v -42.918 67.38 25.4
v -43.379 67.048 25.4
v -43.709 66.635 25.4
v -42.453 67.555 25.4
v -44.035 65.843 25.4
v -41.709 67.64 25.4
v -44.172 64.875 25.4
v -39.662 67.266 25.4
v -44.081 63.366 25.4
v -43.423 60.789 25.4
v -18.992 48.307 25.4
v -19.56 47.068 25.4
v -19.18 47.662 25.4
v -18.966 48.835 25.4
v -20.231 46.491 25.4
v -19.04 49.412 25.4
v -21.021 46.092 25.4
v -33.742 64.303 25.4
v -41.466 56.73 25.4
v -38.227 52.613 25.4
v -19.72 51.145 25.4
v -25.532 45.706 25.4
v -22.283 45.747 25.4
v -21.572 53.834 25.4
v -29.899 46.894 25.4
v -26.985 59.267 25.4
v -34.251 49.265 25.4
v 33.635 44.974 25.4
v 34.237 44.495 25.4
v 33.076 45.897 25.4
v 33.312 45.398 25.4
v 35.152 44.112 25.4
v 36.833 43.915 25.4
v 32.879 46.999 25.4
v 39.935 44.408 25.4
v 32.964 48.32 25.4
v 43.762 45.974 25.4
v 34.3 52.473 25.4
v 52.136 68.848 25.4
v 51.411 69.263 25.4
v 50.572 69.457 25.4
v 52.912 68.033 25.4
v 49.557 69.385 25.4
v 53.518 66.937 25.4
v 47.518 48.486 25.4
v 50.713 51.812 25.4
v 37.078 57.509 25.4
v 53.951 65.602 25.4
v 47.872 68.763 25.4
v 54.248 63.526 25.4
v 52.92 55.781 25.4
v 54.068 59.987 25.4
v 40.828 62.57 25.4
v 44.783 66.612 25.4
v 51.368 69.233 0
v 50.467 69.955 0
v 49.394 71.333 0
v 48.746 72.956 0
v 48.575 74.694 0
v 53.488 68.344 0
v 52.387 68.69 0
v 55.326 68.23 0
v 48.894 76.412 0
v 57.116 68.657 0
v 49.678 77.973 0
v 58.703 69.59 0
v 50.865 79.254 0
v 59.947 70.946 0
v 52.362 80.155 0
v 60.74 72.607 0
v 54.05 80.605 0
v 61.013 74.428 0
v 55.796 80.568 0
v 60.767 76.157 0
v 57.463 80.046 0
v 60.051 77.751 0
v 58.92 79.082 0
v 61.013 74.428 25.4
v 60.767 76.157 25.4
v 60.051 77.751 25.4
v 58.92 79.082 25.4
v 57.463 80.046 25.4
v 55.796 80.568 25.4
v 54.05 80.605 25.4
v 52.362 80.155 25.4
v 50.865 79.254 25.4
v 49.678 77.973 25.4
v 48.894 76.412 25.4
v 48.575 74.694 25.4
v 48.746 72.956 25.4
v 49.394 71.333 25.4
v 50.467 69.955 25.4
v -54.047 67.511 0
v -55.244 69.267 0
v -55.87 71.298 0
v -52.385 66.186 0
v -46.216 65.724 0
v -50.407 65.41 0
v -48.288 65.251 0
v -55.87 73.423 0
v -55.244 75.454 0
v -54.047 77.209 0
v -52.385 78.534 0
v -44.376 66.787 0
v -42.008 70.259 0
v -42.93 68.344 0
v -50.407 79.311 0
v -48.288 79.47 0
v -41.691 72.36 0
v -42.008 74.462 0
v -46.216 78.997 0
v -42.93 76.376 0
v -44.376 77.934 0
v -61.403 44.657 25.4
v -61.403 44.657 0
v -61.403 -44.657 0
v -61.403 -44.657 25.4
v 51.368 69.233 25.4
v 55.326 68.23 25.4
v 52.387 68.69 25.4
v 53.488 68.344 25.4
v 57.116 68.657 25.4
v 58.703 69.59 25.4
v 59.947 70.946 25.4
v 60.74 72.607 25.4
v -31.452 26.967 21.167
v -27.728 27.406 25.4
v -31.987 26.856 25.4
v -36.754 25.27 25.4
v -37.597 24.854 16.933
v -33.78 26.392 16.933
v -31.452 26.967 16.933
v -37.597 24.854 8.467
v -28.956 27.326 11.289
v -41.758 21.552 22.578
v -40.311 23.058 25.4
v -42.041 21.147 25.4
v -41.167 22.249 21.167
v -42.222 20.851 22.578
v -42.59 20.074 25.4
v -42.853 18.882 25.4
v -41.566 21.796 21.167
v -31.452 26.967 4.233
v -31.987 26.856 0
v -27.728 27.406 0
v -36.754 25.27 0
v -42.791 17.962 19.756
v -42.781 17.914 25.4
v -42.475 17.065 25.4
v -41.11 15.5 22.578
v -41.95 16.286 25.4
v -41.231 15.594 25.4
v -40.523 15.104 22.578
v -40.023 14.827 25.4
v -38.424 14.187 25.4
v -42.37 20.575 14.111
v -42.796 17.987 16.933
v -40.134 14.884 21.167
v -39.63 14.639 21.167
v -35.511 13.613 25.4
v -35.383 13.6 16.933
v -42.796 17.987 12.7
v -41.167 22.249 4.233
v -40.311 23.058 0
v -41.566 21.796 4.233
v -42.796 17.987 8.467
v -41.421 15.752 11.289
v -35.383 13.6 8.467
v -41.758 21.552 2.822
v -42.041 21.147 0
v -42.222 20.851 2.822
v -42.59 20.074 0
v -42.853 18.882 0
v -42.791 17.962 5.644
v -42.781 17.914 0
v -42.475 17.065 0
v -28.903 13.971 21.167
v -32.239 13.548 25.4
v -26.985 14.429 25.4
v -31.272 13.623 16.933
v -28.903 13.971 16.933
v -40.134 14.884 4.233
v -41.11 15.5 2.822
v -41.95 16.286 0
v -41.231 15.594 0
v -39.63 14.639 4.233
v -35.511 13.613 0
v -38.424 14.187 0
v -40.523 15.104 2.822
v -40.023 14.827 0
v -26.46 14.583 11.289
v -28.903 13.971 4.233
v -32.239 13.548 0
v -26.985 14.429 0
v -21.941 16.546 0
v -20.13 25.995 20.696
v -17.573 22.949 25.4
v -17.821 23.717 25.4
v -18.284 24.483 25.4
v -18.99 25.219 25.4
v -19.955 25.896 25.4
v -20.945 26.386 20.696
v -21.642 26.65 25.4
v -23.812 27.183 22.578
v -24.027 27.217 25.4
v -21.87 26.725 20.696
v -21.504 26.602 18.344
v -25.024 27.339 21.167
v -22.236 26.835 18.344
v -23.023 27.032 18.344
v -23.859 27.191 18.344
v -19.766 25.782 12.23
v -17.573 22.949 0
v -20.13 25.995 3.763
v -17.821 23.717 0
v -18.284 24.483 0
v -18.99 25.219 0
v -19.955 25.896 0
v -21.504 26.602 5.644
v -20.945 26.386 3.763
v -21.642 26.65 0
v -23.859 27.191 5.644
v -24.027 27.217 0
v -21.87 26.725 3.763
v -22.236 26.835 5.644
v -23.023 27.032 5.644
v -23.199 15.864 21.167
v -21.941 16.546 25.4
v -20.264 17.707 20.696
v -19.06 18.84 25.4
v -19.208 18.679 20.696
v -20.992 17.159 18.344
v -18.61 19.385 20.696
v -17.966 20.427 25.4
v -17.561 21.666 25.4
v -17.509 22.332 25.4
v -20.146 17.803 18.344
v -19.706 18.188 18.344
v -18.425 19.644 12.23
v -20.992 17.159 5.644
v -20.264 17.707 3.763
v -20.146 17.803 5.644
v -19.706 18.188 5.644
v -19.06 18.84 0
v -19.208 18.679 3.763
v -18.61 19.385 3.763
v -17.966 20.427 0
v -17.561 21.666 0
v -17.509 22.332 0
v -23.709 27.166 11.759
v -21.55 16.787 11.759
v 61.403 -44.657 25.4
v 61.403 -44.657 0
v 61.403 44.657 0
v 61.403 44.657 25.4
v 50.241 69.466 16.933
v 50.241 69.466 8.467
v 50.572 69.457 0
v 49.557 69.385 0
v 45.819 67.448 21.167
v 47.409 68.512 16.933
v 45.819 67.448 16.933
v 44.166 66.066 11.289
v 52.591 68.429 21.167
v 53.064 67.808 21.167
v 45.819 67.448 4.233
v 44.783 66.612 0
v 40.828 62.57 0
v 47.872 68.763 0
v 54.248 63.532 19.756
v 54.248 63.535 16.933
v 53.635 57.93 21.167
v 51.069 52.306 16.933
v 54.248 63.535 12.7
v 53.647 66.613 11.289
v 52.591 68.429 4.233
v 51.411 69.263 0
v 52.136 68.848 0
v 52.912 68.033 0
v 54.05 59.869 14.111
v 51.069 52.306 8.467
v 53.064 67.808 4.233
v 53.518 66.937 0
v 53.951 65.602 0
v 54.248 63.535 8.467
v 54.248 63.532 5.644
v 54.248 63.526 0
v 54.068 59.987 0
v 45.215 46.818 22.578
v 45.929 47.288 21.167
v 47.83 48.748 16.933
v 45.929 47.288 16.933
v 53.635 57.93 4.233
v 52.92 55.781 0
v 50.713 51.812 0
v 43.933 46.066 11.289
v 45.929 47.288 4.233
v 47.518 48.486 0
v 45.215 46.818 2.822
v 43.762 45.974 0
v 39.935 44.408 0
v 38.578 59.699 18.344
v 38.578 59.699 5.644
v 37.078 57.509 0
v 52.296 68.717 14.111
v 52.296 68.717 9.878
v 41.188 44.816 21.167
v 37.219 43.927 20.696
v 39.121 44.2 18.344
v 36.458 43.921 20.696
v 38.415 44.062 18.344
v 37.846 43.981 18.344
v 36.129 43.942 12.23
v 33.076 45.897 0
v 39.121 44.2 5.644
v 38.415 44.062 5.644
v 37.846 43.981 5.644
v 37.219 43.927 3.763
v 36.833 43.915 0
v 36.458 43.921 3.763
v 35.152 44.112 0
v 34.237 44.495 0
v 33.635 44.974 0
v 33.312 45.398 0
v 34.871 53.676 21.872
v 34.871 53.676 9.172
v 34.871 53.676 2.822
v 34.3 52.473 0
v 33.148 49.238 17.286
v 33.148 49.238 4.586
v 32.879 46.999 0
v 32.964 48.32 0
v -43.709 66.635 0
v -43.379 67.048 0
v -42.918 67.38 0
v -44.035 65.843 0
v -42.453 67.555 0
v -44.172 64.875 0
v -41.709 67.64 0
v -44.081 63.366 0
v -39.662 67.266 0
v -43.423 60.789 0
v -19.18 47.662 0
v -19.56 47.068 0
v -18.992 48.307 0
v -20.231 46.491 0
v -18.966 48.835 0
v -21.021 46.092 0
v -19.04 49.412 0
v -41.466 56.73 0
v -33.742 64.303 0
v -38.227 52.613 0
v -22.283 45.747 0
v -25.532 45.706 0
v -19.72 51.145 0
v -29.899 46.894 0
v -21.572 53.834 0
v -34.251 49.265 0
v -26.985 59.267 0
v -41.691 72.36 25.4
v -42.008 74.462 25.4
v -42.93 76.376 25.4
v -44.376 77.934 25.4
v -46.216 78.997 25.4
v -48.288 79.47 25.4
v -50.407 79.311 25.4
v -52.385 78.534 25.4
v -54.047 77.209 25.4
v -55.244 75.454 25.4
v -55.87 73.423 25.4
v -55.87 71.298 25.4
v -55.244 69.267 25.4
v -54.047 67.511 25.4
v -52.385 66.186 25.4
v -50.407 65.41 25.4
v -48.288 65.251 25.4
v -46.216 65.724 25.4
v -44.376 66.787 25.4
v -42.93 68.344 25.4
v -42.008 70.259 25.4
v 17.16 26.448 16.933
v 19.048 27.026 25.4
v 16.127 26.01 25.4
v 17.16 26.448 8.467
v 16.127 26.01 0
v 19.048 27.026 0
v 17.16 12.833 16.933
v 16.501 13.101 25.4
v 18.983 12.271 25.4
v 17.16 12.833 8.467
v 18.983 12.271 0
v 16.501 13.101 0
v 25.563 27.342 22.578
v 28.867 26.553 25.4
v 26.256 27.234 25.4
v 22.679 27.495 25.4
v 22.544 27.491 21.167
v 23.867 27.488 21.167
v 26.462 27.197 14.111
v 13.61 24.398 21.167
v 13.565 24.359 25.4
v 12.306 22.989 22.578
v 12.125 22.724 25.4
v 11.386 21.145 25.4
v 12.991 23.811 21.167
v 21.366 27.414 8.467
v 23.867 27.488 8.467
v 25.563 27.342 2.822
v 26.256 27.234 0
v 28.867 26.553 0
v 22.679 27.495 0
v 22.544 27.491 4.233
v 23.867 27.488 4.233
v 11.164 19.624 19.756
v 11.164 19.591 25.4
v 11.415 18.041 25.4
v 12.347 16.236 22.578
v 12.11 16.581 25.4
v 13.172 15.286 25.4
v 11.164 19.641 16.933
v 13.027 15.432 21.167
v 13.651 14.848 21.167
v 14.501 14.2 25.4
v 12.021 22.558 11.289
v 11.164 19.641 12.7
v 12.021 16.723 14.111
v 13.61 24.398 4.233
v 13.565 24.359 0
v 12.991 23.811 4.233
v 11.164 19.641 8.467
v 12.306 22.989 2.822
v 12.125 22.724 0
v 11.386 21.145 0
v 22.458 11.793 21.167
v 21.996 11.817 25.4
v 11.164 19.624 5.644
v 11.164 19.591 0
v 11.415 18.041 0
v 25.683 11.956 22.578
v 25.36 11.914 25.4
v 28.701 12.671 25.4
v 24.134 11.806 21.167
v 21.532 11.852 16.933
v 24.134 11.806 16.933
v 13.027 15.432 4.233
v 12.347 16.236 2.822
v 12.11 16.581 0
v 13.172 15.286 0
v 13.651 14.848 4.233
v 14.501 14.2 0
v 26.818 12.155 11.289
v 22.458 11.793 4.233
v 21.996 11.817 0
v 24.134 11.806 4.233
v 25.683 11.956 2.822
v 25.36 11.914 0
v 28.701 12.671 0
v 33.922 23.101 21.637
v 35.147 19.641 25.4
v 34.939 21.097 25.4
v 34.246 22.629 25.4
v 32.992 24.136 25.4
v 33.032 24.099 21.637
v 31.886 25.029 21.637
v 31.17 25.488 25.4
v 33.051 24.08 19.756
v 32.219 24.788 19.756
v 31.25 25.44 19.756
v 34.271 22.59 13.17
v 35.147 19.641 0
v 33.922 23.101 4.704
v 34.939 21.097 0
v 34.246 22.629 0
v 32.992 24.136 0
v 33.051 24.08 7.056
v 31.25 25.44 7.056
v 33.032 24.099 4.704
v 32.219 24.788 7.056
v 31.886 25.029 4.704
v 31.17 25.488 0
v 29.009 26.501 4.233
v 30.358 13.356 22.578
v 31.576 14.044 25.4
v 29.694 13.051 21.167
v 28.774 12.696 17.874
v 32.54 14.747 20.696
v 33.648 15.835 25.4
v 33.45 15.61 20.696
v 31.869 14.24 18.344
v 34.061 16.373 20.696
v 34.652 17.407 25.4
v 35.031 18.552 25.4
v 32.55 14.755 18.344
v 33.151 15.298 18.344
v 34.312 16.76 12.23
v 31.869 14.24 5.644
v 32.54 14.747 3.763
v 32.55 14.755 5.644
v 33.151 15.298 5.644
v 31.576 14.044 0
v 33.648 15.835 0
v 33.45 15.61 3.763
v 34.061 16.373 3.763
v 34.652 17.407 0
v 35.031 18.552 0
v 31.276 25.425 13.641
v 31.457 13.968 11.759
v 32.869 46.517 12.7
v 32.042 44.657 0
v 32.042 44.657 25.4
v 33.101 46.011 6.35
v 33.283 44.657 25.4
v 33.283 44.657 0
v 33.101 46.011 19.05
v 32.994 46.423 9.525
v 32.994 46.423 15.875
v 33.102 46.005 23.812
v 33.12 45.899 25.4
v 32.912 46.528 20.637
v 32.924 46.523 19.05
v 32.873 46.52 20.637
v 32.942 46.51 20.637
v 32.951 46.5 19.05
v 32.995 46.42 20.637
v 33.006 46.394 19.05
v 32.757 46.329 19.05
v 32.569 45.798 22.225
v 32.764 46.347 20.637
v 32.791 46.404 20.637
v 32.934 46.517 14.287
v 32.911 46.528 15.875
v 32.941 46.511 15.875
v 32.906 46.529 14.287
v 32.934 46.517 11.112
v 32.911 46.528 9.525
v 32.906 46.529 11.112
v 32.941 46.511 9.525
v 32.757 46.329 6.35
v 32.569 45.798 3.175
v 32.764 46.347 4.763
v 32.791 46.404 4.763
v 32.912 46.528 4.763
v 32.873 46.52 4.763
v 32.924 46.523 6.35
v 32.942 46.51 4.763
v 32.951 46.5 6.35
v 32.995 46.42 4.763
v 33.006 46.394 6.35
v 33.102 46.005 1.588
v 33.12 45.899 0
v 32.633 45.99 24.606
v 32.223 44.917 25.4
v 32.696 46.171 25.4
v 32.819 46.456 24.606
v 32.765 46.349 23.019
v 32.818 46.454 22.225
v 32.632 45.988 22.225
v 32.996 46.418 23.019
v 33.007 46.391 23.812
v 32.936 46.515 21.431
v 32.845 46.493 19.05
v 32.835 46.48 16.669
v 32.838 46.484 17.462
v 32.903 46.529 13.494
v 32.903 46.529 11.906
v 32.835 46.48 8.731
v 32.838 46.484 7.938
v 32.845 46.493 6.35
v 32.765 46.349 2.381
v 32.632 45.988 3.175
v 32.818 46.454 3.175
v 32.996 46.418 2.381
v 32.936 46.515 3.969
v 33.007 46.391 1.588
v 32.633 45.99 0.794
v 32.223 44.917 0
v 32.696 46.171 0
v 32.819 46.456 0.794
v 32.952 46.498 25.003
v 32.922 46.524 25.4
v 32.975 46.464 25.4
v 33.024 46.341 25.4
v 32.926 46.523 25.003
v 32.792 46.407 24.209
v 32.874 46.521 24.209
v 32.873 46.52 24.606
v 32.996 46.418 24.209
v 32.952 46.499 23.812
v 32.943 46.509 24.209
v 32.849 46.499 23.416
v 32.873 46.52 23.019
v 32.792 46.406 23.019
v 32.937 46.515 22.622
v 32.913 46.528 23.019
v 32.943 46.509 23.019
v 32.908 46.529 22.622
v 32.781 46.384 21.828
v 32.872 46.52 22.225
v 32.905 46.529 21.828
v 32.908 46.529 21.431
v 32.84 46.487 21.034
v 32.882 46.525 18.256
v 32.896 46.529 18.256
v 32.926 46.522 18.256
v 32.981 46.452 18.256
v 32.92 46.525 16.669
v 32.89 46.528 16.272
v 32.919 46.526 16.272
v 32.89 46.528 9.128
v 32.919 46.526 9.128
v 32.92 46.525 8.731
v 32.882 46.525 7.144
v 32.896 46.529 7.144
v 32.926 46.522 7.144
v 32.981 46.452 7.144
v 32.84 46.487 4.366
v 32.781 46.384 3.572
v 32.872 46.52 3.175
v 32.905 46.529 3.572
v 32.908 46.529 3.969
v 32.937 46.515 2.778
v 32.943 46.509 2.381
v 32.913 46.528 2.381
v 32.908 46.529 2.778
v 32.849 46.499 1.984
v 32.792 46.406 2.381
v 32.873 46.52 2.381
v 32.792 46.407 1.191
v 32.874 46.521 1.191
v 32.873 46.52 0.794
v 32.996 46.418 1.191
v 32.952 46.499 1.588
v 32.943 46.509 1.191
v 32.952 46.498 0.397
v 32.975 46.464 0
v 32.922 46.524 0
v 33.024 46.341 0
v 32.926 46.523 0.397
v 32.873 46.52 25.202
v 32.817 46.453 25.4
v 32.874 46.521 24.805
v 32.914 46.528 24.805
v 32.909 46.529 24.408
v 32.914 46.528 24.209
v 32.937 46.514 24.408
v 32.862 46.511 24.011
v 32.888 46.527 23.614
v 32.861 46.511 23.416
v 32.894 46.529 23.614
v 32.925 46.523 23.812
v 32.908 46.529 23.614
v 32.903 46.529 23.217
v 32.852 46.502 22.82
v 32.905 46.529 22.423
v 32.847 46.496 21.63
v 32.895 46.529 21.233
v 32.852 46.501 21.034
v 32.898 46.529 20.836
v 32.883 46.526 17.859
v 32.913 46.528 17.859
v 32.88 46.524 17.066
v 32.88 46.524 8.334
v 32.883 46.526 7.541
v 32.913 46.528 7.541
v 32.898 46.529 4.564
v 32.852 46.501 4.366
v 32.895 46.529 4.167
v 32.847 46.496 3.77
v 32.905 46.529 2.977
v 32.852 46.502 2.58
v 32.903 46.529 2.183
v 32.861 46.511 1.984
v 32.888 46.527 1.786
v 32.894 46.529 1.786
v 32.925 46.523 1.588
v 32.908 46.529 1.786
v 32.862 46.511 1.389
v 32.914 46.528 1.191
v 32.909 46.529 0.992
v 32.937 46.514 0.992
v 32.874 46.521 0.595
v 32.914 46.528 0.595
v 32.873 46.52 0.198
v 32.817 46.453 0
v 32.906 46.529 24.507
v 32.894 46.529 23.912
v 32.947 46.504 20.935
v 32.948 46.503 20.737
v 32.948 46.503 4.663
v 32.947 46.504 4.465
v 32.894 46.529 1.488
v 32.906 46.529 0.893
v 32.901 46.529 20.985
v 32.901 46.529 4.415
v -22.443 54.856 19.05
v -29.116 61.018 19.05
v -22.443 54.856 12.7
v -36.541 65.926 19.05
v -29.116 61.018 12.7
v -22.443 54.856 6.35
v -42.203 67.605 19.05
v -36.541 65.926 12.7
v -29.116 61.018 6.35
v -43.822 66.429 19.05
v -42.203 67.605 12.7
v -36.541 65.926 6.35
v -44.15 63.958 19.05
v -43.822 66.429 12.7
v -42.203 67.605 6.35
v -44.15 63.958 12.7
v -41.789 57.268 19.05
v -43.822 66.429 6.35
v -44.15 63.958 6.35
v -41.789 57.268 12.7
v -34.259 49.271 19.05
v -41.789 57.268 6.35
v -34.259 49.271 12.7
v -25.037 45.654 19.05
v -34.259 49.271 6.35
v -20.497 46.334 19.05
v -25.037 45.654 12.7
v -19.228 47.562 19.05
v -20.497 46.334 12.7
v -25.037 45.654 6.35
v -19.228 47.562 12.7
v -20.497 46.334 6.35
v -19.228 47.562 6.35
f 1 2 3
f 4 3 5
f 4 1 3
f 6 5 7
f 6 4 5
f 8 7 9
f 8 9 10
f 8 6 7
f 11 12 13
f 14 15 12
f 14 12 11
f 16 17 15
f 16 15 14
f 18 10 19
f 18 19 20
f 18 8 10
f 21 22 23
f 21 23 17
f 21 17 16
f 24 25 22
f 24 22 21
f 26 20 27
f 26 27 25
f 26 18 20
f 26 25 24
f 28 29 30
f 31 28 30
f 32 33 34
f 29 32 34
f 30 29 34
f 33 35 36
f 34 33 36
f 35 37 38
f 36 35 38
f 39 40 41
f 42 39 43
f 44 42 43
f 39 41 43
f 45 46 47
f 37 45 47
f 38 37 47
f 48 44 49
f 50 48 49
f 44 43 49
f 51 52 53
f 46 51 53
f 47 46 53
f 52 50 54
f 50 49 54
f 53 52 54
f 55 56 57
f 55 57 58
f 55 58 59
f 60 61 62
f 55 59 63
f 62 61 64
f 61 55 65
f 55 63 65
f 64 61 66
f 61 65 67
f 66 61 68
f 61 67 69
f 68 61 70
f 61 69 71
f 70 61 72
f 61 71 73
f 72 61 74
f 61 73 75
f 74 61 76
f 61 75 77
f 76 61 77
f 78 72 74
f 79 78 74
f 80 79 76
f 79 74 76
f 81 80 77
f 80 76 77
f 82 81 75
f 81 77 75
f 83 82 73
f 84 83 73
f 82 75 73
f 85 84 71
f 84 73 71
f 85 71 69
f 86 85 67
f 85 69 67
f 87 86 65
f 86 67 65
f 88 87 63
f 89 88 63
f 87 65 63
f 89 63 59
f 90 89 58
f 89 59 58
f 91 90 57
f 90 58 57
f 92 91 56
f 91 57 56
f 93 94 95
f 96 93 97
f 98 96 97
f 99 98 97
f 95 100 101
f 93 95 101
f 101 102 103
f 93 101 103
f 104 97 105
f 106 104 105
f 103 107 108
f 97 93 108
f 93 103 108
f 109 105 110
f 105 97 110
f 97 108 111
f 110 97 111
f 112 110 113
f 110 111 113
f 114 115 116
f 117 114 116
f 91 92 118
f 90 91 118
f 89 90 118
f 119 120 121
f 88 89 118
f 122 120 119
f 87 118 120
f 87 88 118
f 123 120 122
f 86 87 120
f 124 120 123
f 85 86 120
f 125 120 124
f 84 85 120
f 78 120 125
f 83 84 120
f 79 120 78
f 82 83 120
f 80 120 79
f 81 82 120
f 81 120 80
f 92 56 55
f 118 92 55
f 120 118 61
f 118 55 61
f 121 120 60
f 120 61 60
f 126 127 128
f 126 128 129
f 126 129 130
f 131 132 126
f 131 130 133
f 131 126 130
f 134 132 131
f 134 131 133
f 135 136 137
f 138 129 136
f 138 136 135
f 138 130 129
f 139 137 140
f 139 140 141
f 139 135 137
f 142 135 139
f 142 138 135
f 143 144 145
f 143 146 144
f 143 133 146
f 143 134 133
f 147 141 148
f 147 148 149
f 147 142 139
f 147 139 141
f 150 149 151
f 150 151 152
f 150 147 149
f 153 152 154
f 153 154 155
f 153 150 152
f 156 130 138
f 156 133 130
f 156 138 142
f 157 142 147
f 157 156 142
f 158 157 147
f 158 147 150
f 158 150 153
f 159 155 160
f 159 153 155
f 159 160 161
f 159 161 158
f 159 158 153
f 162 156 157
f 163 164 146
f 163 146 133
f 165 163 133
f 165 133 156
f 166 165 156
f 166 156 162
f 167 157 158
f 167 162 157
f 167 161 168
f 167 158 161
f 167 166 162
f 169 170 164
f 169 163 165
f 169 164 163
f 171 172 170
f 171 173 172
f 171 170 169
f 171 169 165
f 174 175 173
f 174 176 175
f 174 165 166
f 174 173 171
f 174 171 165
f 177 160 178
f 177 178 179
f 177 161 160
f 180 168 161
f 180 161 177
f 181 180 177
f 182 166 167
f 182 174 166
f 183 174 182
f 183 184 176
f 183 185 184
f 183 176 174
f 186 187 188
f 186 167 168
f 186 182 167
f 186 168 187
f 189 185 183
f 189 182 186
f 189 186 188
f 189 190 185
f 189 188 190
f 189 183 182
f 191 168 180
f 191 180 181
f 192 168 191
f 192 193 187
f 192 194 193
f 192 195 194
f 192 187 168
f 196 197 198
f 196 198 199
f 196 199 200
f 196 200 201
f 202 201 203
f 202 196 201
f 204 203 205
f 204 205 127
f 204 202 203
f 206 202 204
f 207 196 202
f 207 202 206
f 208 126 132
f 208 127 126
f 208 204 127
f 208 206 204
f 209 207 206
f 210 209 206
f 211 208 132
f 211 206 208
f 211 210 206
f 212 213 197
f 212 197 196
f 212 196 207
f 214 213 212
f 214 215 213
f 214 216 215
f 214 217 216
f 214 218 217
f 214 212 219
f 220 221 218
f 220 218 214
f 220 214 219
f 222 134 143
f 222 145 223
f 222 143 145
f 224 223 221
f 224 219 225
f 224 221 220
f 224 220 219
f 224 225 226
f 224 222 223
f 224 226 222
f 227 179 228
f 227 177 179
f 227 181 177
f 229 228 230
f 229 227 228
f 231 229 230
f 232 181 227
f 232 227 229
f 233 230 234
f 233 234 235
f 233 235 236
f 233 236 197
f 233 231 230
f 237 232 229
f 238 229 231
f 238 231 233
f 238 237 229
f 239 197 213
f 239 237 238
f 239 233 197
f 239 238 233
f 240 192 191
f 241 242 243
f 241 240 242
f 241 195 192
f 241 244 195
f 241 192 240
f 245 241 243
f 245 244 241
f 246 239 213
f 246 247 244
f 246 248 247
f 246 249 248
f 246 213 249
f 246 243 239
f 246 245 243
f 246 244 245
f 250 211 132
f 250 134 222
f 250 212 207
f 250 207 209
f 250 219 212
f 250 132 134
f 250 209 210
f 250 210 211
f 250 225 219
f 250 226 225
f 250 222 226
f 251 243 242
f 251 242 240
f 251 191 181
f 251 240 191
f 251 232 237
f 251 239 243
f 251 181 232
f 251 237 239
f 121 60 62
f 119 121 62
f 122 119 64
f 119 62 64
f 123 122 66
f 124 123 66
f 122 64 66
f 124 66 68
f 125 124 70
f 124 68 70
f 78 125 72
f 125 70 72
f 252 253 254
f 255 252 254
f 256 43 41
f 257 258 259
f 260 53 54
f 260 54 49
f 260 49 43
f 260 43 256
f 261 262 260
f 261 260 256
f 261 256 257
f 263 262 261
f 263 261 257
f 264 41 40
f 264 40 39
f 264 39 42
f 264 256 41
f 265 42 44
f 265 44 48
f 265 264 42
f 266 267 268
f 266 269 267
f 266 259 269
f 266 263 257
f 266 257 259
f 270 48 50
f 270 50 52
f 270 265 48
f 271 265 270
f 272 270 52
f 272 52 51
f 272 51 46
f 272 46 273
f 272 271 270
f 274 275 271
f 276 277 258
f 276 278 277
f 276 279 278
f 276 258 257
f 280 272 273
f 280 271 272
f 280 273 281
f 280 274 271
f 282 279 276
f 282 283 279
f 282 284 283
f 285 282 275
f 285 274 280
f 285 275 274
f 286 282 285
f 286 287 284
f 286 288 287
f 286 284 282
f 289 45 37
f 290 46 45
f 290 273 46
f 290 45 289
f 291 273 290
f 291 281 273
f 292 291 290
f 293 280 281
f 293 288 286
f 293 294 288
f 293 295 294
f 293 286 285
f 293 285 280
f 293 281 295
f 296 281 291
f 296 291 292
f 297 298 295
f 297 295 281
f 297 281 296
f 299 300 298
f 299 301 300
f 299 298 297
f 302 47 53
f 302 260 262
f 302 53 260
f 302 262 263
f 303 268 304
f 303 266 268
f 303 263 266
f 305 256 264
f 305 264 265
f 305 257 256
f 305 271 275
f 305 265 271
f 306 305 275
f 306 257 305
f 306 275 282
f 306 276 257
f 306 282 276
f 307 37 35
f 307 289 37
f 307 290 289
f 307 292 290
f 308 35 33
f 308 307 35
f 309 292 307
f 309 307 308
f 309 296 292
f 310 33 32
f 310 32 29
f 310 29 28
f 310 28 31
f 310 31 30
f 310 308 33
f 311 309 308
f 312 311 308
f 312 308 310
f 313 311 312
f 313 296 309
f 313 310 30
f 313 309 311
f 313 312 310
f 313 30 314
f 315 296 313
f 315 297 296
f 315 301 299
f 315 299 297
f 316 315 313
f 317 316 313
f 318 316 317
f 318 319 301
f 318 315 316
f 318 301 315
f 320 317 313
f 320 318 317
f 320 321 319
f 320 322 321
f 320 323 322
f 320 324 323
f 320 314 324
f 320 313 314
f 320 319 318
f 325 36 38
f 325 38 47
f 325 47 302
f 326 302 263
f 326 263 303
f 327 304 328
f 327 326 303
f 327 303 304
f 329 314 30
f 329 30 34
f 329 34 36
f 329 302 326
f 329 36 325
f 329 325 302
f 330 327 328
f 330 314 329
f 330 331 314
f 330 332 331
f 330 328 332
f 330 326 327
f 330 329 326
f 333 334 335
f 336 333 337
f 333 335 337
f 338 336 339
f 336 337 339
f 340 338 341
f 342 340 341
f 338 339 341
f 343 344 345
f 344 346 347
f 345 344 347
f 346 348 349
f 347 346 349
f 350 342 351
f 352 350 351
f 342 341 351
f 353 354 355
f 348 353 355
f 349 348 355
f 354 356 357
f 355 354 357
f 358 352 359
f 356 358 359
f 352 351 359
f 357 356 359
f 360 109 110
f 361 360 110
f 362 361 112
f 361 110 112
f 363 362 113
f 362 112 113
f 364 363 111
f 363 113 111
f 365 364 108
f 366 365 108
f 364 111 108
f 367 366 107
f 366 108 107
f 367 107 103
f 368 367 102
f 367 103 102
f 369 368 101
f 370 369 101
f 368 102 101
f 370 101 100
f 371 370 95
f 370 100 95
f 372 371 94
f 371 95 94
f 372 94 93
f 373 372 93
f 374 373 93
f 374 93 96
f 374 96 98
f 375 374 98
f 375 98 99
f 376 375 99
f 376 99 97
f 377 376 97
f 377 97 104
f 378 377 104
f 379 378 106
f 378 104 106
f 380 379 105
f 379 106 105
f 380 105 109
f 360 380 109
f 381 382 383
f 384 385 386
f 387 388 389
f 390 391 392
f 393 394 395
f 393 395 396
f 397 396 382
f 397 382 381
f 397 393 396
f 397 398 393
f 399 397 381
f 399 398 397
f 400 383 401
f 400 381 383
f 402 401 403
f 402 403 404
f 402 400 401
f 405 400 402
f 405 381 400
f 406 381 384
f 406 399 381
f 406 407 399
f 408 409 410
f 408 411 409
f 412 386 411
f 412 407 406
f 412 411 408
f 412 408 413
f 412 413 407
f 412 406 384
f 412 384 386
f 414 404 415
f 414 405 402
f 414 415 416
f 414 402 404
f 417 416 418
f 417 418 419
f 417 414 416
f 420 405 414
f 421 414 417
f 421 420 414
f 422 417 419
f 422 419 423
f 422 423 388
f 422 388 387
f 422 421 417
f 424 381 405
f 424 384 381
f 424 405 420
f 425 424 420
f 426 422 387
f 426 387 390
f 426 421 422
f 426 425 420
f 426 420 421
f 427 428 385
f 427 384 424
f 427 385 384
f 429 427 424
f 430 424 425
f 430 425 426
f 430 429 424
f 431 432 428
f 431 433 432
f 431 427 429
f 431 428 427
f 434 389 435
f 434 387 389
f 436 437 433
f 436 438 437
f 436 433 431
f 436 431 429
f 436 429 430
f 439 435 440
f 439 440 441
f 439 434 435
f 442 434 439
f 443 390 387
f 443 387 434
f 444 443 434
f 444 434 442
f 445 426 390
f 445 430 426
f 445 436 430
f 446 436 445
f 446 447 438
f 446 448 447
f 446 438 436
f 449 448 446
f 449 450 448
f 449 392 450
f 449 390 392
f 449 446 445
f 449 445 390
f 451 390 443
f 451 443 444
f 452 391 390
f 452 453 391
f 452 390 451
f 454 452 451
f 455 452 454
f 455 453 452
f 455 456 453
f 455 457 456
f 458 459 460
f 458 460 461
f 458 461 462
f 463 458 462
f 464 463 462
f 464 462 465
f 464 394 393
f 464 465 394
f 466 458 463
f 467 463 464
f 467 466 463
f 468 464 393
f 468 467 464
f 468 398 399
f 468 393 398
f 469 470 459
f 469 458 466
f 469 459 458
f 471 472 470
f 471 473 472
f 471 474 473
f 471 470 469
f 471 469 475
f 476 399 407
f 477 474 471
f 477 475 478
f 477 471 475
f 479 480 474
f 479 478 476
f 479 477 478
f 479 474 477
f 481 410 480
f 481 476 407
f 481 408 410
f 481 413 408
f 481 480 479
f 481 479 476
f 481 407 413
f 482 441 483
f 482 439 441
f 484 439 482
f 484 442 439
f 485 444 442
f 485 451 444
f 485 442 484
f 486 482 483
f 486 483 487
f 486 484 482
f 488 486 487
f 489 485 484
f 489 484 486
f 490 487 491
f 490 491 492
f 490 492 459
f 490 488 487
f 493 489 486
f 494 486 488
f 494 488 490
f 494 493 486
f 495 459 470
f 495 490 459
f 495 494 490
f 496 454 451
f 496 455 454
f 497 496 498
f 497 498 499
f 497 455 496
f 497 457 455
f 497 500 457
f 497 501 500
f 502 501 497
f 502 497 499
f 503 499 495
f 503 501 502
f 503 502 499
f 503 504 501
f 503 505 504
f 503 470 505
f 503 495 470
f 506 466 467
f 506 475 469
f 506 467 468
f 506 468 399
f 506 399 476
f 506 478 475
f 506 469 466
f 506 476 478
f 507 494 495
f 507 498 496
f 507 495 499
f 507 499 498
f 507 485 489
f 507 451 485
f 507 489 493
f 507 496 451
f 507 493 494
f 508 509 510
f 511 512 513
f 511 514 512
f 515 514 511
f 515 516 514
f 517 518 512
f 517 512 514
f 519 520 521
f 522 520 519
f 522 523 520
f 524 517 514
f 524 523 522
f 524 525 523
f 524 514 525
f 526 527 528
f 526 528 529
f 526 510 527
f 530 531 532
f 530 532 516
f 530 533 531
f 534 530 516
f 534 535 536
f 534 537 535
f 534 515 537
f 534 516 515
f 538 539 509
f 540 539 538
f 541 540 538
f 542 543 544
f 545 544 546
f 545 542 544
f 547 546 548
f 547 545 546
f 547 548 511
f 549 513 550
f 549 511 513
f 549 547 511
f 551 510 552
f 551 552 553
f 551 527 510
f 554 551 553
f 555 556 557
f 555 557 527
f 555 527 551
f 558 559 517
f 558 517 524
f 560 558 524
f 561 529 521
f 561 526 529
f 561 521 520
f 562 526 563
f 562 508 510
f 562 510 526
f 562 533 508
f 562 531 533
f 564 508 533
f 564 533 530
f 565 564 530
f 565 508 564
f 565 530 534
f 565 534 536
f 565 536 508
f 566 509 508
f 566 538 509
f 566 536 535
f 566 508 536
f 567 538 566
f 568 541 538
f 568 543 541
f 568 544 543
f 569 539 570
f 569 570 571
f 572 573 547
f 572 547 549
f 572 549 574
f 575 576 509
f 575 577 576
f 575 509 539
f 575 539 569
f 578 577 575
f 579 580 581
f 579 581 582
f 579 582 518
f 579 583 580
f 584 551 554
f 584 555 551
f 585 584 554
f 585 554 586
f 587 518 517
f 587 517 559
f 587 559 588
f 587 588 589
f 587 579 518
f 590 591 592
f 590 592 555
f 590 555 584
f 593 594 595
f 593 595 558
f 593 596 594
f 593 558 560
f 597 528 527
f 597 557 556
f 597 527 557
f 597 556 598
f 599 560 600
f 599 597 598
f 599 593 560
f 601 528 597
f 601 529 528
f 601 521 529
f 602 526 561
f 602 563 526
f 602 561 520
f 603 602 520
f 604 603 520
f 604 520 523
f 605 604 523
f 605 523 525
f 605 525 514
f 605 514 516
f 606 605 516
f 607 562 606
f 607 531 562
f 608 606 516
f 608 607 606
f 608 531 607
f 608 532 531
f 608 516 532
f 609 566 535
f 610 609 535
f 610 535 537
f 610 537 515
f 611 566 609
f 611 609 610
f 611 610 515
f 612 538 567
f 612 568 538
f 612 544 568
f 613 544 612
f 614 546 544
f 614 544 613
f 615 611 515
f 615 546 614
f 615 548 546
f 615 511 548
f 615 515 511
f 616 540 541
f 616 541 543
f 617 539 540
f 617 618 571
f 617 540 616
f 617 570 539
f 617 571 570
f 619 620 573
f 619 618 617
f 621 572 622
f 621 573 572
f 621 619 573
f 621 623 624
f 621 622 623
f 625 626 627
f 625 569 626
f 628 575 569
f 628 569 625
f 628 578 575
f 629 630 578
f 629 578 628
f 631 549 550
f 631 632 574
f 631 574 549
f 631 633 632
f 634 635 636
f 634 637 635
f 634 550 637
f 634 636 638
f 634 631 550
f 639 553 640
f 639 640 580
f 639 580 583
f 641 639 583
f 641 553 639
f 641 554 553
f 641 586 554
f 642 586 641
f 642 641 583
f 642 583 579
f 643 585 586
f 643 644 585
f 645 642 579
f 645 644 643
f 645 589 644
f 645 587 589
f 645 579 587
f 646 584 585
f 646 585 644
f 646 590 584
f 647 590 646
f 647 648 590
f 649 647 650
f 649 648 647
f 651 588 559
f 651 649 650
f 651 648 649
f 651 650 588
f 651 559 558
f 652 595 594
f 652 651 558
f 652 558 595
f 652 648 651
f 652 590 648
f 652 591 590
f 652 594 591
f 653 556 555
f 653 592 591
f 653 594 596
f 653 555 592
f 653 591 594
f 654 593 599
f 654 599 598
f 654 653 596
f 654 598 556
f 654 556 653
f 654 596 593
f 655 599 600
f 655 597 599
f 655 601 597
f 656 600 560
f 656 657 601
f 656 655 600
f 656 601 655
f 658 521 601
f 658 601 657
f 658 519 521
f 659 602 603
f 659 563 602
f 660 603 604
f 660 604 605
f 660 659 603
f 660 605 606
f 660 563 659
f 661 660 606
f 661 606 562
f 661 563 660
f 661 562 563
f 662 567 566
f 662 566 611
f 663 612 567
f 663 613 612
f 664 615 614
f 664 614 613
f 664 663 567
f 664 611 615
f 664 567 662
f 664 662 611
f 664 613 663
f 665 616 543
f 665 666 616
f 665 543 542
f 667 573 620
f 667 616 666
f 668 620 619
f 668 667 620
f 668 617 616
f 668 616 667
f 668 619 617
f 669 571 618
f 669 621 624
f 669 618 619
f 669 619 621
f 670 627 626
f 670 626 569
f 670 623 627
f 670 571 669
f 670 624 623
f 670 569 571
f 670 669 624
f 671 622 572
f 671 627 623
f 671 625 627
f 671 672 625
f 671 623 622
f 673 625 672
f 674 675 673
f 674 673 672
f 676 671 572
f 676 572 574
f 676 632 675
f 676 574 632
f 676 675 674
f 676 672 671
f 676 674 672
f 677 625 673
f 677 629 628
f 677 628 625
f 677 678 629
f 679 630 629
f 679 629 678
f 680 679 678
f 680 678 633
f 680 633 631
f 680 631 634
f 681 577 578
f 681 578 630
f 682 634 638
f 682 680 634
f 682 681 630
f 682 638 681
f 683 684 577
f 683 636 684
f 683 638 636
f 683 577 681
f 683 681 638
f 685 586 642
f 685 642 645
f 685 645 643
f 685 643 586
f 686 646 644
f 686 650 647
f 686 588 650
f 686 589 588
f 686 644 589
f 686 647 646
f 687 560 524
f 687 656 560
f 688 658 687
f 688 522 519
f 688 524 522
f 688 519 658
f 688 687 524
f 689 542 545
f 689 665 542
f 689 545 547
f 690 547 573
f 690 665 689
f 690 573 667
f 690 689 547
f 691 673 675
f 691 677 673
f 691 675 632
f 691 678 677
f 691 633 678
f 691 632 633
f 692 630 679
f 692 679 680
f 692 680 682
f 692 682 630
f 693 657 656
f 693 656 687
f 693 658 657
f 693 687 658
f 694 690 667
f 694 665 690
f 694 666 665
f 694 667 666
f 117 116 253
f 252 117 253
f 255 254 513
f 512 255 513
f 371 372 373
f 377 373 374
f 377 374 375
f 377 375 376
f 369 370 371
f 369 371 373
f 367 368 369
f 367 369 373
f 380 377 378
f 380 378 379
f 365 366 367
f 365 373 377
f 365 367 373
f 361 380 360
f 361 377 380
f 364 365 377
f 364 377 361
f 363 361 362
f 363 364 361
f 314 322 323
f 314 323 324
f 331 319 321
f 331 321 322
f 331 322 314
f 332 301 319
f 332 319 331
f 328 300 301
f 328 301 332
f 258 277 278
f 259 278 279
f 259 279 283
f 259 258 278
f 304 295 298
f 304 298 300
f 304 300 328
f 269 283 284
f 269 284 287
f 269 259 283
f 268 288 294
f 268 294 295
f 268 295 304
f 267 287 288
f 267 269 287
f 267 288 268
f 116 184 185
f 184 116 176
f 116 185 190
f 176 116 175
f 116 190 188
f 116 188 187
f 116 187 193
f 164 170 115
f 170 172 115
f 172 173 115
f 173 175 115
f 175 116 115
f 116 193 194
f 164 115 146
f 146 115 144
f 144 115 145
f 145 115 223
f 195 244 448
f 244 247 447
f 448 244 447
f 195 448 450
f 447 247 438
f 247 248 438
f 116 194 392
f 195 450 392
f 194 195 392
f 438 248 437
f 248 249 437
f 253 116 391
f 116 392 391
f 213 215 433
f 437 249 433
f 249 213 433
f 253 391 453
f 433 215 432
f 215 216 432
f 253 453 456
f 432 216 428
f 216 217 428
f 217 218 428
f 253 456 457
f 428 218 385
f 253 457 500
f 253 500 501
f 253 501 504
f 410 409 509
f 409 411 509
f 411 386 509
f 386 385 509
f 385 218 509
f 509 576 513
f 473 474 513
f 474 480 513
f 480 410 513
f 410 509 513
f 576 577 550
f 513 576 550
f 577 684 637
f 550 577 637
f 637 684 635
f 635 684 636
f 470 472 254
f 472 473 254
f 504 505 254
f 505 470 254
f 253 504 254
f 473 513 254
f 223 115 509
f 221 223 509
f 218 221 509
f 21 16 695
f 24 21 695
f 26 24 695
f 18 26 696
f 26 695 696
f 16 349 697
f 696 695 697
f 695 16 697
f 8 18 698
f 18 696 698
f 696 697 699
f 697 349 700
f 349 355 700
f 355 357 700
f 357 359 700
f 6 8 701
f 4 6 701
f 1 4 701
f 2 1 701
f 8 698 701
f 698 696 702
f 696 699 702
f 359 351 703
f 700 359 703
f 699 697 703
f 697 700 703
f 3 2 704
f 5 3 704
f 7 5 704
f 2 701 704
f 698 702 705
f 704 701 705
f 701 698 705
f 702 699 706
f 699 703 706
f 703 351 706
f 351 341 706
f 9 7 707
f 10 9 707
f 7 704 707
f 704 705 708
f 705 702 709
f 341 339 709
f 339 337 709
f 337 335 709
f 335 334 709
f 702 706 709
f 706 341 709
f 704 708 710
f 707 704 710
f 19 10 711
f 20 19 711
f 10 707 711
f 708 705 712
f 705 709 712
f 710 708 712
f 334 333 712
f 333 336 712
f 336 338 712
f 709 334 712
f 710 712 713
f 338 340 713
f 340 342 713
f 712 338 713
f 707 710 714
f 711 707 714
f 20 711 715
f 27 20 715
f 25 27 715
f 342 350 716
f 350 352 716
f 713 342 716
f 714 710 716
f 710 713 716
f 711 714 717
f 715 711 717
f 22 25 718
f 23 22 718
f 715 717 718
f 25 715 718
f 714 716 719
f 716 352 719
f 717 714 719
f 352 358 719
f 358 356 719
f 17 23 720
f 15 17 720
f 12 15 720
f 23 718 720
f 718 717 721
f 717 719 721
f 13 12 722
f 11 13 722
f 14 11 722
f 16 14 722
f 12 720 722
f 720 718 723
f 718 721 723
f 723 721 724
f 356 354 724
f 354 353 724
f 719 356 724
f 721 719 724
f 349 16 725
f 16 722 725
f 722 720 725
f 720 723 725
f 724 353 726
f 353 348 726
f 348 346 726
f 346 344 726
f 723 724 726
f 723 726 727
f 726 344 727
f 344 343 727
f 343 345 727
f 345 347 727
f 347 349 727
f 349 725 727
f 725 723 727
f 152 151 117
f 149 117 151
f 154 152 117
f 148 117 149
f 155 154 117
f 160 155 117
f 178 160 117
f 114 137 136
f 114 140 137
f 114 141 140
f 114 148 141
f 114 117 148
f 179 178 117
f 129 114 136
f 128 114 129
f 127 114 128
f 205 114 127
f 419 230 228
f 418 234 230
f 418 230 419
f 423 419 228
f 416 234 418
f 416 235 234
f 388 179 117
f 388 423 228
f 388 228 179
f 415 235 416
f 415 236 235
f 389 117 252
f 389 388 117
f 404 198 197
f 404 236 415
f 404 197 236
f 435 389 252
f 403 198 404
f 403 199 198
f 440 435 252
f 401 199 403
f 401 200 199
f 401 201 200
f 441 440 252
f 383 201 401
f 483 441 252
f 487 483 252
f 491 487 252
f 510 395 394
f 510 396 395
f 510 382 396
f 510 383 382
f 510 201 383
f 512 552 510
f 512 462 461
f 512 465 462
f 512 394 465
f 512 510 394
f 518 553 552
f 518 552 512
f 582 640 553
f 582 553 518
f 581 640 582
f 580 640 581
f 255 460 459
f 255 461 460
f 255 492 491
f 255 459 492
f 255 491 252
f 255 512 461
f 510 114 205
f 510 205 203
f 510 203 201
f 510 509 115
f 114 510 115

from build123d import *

# Parameters (mm, degrees)
F1_DEPTH = 25.4
F0_R     = 7.1291178454
F3_DEPTH = 25.4


with BuildPart() as f1:
    # F0 (on Top) → F1 (new body)
    with BuildSketch(Plane.XY):
        with BuildLine():
            ThreePointArc((50.4670934629, 69.9548799766), (51.8648250984, 68.9377295564), (53.4884831128, 68.3444477058))
            add(Edge.make_bspline(
                [(50.4670934629, 69.9548799766), (51.67938739, 69.5537530757), (52.7325190993, 68.8736623691), (53.4884831128, 68.3444477058)],
                knots=[0.7241837318, 0.7241837318, 0.7241837318, 0.7241837318, 0.856927309, 0.856927309, 0.856927309, 0.856927309], degree=3))
        make_face()
        with BuildLine():
            add(Edge.make_bspline(
                [(50.4670934629, 69.9548799766), (51.67938739, 69.5537530757), (52.7325190993, 68.8736623691), (53.4884831128, 68.3444477058)],
                knots=[0.7241837318, 0.7241837318, 0.7241837318, 0.7241837318, 0.856927309, 0.856927309, 0.856927309, 0.856927309], degree=3))
            ThreePointArc((53.4884831128, 68.3444477058), (58.7027396854, 69.5900480762), (61.0125194262, 74.4279101491))
            ThreePointArc((61.0125194262, 74.4279101491), (52.3617555873, 80.1553442969), (50.4670934629, 69.9548799766))
        make_face()
    extrude(amount=F1_DEPTH)


with BuildPart() as f1b:
    # F0 (on Top) → F1, piece 2 (new body)
    with BuildSketch(Plane.XY):
        with BuildLine():
            Line((-61.4030249417, -44.6567460895), (61.4030249417, -44.6567460895))
            Line((61.4030249417, -44.6567460895), (61.4030249417, 44.6567460895))
            Line((61.4030249417, 44.6567460895), (33.2829244435, 44.6567460895))
            Line((33.2829244435, 44.6567460895), (32.0420637727, 44.6567460895))
            add(Edge.make_bspline(
                [(31.6284447908, 44.6567460895), (31.6719465842, 44.5108211024), (31.8697115608, 44.4857987754), (32.0420637727, 44.6567460895)],
                knots=[0.6233187493, 0.6233187493, 0.6233187493, 0.6233187493, 0.6935227523, 0.6935227523, 0.6935227523, 0.6935227523], degree=3))
            Line((31.6284447908, 44.6567460895), (-61.4030249417, 44.6567460895))
            Line((-61.4030249417, 44.6567460895), (-61.4030249417, -44.6567460895))
        make_face()
        with BuildLine():
            add(Edge.make_bspline(
                [(-17.5732560456, 22.9486040771), (-19.7870861976, 34.2022424839), (-37.5972632437, 24.8540287044), (-55.4074402899, 15.5058149248), (-35.3834330917, 13.6003902976), (-15.3594258935, 11.6949656703), (-17.5732560456, 22.9486040771)],
                knots=[0, 0, 0, 2.0943951024, 2.0943951024, 4.1887902048, 4.1887902048, 6.2831853072, 6.2831853072, 6.2831853072], degree=2, weights=[1, 0.5, 1, 0.5, 1, 0.5, 1]))
        make_face(mode=Mode.SUBTRACT)
        with BuildLine():
            add(Edge.make_bspline(
                [(35.1465120912, 19.6406971663), (35.1465120912, 33.2562682867), (17.1597693115, 26.4484827265), (-0.8269734681, 19.6406971663), (17.1597693115, 12.8329116062), (35.1465120912, 6.025126046), (35.1465120912, 19.6406971663)],
                knots=[0, 0, 0, 2.0943951024, 2.0943951024, 4.1887902048, 4.1887902048, 6.2831853072, 6.2831853072, 6.2831853072], degree=2, weights=[1, 0.5, 1, 0.5, 1, 0.5, 1]))
        make_face(mode=Mode.SUBTRACT)
        with BuildLine():
            Line((32.0420637727, 44.6567460895), (33.2829244435, 44.6567460895))
            add(Edge.make_bspline(
                [(32.0420637727, 44.6567460895), (32.4244808231, 45.0360459366), (32.9307335094, 47.6805361445), (33.1668272031, 45.6535170079), (33.2829244435, 44.6567460895)],
                knots=[0.6935227523, 0.6935227523, 0.6935227523, 0.6935227523, 0.8492921936, 1, 1, 1, 1], degree=3))
        make_face()
        with BuildLine():
            Line((32.0420637727, 44.6567460895), (31.6284447908, 44.6567460895))
            add(Edge.make_bspline(
                [(31.6284447908, 44.6567460895), (31.6719465842, 44.5108211024), (31.8697115608, 44.4857987754), (32.0420637727, 44.6567460895)],
                knots=[0.6233187493, 0.6233187493, 0.6233187493, 0.6233187493, 0.6935227523, 0.6935227523, 0.6935227523, 0.6935227523], degree=3))
        make_face()
    extrude(amount=F1_DEPTH)


with BuildPart() as f1c:
    # F0 (on Top) → F1, piece 3 (new body)
    with BuildSketch(Plane.XY):
        with BuildLine():
            add(Edge.make_bspline(
                [(-19.039971754, 49.4118593633), (-20.2792718662, 55.3138094476), (-46.8285584894, 76.1498871453), (-43.1619688481, 54.2963633972), (-26.7946297406, 43.3694384517), (-18.4324582283, 46.5186824254), (-19.039971754, 49.4118593633)],
                knots=[0, 0, 0, 0, 0.3430790237, 0.5464085177, 0.8318202789, 1, 1, 1, 1], degree=3))
        make_face()
    extrude(amount=F1_DEPTH)


with BuildPart() as f1d:
    # F0 (on Top) → F1, piece 4 (new body)
    with BuildSketch(Plane.XY):
        with Locations((-48.8205961883, 72.3604634404)):
            Circle(F0_R)
    extrude(amount=F1_DEPTH)


with BuildPart() as f3:
    # F2 (on Top) → F3 (new body)
    with BuildSketch(Plane.XY):
        with BuildLine():
            add(Edge.make_bspline(
                [(33.0761149526, 45.8972081542), (31.1070518213, 51.4487691155), (53.9197684523, 83.0318615687), (56.7605581654, 48.3689867838), (34.6698011682, 41.4039818889), (33.0761149526, 45.8972081542)],
                knots=[0, 0, 0, 0, 0.3880535212, 0.6859239616, 1, 1, 1, 1], degree=3))
        make_face()
    extrude(amount=F3_DEPTH)


solid = Compound([f1.part, f1b.part, f1c.part, f1d.part, f3.part])
